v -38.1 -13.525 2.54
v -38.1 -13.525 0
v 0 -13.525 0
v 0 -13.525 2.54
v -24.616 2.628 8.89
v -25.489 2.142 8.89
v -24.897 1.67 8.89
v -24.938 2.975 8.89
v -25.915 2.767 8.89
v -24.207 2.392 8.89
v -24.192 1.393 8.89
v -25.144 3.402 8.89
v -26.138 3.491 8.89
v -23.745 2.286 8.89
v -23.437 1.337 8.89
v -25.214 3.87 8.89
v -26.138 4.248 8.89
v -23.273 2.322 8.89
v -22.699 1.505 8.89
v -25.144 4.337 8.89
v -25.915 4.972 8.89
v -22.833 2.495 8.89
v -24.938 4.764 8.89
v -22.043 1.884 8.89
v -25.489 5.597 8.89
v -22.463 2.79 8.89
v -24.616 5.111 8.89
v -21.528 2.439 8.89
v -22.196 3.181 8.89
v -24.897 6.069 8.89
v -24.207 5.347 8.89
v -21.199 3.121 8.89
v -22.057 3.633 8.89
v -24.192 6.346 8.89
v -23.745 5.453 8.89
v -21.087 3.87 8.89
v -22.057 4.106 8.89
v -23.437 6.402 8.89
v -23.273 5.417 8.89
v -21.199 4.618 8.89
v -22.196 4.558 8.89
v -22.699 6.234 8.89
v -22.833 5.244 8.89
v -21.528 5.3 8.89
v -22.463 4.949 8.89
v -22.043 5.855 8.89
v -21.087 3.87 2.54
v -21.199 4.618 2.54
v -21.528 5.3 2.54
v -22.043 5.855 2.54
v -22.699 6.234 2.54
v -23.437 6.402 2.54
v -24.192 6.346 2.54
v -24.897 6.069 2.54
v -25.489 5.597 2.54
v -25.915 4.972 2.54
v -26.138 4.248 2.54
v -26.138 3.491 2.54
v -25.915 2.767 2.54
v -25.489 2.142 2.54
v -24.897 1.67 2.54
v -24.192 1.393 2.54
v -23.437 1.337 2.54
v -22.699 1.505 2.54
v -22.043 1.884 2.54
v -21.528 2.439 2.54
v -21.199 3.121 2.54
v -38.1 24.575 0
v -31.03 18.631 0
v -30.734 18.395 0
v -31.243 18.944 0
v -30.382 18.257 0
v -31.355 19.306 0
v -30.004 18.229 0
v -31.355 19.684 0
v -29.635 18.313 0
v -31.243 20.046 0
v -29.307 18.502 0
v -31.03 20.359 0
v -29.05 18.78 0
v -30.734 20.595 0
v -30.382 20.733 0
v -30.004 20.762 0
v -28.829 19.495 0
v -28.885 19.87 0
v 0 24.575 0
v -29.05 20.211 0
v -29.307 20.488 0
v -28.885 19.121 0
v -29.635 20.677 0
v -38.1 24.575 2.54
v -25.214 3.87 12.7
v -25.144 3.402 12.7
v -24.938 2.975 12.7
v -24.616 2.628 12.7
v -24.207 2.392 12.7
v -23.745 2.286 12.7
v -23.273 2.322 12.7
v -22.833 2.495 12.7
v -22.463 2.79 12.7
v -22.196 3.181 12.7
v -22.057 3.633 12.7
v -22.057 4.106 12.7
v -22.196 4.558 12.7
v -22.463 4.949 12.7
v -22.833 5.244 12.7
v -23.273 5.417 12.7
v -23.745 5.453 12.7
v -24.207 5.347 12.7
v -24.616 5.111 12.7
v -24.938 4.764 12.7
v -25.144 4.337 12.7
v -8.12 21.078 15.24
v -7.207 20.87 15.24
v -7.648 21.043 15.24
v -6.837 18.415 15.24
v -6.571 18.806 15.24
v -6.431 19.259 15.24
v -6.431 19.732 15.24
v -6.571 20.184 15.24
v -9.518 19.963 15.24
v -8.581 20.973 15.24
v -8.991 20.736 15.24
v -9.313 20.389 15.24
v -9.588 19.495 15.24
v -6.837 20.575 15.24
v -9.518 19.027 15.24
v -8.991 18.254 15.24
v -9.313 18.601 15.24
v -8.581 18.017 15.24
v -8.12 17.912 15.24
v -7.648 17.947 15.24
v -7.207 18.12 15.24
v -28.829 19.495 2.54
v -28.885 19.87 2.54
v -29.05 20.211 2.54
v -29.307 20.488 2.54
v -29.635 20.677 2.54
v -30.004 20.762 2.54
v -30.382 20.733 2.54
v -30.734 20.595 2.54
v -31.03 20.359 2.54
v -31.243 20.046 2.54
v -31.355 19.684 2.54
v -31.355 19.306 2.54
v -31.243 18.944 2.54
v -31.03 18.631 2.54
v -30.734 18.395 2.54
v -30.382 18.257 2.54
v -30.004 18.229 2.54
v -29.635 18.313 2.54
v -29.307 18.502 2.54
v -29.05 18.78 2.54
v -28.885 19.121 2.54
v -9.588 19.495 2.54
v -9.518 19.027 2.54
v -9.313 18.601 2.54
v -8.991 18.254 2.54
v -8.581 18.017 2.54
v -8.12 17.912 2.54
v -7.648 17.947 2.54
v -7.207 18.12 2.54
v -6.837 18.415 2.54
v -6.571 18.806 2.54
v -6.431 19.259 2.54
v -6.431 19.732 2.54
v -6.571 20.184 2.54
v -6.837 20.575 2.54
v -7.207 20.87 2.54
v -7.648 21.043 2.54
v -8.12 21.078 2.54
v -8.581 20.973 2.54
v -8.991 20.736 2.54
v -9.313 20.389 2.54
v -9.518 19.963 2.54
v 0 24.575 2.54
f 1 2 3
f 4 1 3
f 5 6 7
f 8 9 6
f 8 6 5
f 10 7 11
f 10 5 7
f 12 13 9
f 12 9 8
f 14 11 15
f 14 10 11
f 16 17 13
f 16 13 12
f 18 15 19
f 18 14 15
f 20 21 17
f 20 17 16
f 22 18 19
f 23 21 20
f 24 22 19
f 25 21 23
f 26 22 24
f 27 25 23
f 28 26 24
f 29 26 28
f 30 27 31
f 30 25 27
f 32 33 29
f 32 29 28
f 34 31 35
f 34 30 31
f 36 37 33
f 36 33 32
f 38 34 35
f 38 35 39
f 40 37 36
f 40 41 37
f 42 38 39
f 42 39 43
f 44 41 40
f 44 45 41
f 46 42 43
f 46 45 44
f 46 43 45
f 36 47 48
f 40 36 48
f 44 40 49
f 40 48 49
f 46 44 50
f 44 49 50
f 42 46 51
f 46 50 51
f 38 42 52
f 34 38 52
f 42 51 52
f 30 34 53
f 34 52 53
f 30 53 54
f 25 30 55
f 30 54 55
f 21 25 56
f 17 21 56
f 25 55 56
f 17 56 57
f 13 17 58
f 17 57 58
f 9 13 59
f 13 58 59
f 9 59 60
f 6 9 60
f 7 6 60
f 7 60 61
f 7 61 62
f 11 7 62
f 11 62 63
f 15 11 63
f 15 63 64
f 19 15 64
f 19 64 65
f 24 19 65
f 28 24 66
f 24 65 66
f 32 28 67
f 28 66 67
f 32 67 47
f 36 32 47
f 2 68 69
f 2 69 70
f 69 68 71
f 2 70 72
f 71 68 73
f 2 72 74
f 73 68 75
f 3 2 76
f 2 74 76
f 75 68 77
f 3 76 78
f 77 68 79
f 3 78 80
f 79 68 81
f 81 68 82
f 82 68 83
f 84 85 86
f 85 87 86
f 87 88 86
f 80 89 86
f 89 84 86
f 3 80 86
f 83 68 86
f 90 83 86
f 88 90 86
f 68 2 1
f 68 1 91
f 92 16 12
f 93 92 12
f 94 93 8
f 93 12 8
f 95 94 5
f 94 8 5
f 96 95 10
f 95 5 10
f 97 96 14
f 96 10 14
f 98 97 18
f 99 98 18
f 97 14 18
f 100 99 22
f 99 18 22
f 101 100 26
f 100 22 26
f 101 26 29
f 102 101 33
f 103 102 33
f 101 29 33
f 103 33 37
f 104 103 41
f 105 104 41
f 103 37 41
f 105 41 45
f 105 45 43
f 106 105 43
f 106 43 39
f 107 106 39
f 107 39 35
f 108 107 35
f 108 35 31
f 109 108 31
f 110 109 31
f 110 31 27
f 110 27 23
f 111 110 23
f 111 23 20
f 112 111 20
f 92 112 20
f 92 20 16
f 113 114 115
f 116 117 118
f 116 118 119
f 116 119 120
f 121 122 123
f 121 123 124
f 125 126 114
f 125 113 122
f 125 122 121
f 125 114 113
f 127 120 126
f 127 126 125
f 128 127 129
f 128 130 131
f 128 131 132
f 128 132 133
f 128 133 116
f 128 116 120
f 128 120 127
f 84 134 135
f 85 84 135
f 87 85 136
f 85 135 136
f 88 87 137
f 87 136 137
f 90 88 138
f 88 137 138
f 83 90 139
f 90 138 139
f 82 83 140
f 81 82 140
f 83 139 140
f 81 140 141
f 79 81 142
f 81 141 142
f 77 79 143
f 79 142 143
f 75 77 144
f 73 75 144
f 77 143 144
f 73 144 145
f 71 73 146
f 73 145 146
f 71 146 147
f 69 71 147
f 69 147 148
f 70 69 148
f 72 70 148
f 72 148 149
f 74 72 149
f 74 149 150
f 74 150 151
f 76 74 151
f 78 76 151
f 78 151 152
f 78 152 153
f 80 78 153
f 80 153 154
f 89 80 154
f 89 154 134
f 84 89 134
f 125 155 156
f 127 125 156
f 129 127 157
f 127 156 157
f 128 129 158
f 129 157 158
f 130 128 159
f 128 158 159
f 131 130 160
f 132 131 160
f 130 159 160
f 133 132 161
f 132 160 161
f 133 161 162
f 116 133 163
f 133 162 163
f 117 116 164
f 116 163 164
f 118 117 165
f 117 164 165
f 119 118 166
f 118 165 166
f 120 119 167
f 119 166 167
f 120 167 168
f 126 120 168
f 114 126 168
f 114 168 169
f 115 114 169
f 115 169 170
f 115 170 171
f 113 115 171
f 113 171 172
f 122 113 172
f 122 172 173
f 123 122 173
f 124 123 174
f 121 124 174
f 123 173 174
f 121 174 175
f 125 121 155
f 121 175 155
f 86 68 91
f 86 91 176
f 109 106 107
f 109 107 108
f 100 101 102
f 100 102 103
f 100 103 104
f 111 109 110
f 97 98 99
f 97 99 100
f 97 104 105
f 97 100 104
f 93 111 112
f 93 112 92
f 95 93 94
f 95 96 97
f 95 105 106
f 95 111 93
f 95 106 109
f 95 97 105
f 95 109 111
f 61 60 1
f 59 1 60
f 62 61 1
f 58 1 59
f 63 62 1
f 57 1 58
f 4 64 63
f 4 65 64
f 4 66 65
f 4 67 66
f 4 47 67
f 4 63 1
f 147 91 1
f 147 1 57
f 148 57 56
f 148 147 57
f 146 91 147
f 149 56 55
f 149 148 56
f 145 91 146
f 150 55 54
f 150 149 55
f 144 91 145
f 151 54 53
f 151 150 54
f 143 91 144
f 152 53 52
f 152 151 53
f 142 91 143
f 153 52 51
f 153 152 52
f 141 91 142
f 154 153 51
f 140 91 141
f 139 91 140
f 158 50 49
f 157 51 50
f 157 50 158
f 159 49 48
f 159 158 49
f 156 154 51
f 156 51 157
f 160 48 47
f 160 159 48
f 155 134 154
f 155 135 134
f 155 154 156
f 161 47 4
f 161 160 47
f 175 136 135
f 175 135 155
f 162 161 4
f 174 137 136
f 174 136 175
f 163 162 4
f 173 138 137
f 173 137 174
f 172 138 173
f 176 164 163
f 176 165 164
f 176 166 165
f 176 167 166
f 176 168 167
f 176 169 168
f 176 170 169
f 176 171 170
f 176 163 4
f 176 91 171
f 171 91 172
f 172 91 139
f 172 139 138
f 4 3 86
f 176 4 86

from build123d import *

# Parameters (mm, degrees)
SKETCH1_W           = 38.1
SKETCH1_H           = 38.1
BOSS_EXTRUDE1_DEPTH = 2.54
SKETCH2_R           = 1.5875
SKETCH2_R_2         = 1.27
BOSS_EXTRUDE2_DEPTH = 12.7
SKETCH5_R           = 1.27
CUT_EXTRUDE1_DEPTH  = 48.83102763
SKETCH6_R           = 2.54
BOSS_EXTRUDE3_DEPTH = 6.35
CUT_EXTRUDE2_START  = -2.54
SKETCH7_R           = 1.5875
CUT_EXTRUDE2_DEPTH  = 2.54


with BuildPart() as part:
    # Sketch1 → Boss-Extrude1 (new body)
    with BuildSketch(Plane.XY):
        with Locations((-19.05, 5.525182688)):
            Rectangle(SKETCH1_W, SKETCH1_H)
    extrude(amount=BOSS_EXTRUDE1_DEPTH)

    # Sketch2 → Boss-Extrude2 (add)
    with BuildSketch(Plane.XY.offset(2.54)):
        with Locations(Location((-8.001, 19.495182688, 0), (0, 0, 180))):
            Circle(SKETCH2_R)
        with Locations(Location((-23.626645651, 3.869537037, 0), (0, 0, 180))):
            Circle(SKETCH2_R)
        with Locations(Location((-30.099, 19.495182688, 0), (0, 0, 180))):
            Circle(SKETCH2_R_2)
    extrude(amount=BOSS_EXTRUDE2_DEPTH)

    # Sketch5 → Cut-Extrude1 (cut, through all)
    with BuildSketch(Plane.XY.offset(15.24)):
        with Locations((-30.099, 19.495182688)):
            Circle(SKETCH5_R)
    extrude(amount=-CUT_EXTRUDE1_DEPTH, mode=Mode.SUBTRACT)

    # Sketch6 → Boss-Extrude3 (add)
    with BuildSketch(Plane.XY.offset(2.54)):
        with Locations((-23.626645651, 3.869537037)):
            Circle(SKETCH6_R)
    extrude(amount=BOSS_EXTRUDE3_DEPTH)

    # Sketch7 → Cut-Extrude2 (cut)
    with BuildSketch(Plane.XY.offset(15.24).offset(CUT_EXTRUDE2_START)):
        with Locations(Location((-23.626645651, 3.869537037, 0), (0, 0, 180))):
            Circle(SKETCH7_R)
    extrude(amount=CUT_EXTRUDE2_DEPTH, mode=Mode.SUBTRACT)


solid = part.part
